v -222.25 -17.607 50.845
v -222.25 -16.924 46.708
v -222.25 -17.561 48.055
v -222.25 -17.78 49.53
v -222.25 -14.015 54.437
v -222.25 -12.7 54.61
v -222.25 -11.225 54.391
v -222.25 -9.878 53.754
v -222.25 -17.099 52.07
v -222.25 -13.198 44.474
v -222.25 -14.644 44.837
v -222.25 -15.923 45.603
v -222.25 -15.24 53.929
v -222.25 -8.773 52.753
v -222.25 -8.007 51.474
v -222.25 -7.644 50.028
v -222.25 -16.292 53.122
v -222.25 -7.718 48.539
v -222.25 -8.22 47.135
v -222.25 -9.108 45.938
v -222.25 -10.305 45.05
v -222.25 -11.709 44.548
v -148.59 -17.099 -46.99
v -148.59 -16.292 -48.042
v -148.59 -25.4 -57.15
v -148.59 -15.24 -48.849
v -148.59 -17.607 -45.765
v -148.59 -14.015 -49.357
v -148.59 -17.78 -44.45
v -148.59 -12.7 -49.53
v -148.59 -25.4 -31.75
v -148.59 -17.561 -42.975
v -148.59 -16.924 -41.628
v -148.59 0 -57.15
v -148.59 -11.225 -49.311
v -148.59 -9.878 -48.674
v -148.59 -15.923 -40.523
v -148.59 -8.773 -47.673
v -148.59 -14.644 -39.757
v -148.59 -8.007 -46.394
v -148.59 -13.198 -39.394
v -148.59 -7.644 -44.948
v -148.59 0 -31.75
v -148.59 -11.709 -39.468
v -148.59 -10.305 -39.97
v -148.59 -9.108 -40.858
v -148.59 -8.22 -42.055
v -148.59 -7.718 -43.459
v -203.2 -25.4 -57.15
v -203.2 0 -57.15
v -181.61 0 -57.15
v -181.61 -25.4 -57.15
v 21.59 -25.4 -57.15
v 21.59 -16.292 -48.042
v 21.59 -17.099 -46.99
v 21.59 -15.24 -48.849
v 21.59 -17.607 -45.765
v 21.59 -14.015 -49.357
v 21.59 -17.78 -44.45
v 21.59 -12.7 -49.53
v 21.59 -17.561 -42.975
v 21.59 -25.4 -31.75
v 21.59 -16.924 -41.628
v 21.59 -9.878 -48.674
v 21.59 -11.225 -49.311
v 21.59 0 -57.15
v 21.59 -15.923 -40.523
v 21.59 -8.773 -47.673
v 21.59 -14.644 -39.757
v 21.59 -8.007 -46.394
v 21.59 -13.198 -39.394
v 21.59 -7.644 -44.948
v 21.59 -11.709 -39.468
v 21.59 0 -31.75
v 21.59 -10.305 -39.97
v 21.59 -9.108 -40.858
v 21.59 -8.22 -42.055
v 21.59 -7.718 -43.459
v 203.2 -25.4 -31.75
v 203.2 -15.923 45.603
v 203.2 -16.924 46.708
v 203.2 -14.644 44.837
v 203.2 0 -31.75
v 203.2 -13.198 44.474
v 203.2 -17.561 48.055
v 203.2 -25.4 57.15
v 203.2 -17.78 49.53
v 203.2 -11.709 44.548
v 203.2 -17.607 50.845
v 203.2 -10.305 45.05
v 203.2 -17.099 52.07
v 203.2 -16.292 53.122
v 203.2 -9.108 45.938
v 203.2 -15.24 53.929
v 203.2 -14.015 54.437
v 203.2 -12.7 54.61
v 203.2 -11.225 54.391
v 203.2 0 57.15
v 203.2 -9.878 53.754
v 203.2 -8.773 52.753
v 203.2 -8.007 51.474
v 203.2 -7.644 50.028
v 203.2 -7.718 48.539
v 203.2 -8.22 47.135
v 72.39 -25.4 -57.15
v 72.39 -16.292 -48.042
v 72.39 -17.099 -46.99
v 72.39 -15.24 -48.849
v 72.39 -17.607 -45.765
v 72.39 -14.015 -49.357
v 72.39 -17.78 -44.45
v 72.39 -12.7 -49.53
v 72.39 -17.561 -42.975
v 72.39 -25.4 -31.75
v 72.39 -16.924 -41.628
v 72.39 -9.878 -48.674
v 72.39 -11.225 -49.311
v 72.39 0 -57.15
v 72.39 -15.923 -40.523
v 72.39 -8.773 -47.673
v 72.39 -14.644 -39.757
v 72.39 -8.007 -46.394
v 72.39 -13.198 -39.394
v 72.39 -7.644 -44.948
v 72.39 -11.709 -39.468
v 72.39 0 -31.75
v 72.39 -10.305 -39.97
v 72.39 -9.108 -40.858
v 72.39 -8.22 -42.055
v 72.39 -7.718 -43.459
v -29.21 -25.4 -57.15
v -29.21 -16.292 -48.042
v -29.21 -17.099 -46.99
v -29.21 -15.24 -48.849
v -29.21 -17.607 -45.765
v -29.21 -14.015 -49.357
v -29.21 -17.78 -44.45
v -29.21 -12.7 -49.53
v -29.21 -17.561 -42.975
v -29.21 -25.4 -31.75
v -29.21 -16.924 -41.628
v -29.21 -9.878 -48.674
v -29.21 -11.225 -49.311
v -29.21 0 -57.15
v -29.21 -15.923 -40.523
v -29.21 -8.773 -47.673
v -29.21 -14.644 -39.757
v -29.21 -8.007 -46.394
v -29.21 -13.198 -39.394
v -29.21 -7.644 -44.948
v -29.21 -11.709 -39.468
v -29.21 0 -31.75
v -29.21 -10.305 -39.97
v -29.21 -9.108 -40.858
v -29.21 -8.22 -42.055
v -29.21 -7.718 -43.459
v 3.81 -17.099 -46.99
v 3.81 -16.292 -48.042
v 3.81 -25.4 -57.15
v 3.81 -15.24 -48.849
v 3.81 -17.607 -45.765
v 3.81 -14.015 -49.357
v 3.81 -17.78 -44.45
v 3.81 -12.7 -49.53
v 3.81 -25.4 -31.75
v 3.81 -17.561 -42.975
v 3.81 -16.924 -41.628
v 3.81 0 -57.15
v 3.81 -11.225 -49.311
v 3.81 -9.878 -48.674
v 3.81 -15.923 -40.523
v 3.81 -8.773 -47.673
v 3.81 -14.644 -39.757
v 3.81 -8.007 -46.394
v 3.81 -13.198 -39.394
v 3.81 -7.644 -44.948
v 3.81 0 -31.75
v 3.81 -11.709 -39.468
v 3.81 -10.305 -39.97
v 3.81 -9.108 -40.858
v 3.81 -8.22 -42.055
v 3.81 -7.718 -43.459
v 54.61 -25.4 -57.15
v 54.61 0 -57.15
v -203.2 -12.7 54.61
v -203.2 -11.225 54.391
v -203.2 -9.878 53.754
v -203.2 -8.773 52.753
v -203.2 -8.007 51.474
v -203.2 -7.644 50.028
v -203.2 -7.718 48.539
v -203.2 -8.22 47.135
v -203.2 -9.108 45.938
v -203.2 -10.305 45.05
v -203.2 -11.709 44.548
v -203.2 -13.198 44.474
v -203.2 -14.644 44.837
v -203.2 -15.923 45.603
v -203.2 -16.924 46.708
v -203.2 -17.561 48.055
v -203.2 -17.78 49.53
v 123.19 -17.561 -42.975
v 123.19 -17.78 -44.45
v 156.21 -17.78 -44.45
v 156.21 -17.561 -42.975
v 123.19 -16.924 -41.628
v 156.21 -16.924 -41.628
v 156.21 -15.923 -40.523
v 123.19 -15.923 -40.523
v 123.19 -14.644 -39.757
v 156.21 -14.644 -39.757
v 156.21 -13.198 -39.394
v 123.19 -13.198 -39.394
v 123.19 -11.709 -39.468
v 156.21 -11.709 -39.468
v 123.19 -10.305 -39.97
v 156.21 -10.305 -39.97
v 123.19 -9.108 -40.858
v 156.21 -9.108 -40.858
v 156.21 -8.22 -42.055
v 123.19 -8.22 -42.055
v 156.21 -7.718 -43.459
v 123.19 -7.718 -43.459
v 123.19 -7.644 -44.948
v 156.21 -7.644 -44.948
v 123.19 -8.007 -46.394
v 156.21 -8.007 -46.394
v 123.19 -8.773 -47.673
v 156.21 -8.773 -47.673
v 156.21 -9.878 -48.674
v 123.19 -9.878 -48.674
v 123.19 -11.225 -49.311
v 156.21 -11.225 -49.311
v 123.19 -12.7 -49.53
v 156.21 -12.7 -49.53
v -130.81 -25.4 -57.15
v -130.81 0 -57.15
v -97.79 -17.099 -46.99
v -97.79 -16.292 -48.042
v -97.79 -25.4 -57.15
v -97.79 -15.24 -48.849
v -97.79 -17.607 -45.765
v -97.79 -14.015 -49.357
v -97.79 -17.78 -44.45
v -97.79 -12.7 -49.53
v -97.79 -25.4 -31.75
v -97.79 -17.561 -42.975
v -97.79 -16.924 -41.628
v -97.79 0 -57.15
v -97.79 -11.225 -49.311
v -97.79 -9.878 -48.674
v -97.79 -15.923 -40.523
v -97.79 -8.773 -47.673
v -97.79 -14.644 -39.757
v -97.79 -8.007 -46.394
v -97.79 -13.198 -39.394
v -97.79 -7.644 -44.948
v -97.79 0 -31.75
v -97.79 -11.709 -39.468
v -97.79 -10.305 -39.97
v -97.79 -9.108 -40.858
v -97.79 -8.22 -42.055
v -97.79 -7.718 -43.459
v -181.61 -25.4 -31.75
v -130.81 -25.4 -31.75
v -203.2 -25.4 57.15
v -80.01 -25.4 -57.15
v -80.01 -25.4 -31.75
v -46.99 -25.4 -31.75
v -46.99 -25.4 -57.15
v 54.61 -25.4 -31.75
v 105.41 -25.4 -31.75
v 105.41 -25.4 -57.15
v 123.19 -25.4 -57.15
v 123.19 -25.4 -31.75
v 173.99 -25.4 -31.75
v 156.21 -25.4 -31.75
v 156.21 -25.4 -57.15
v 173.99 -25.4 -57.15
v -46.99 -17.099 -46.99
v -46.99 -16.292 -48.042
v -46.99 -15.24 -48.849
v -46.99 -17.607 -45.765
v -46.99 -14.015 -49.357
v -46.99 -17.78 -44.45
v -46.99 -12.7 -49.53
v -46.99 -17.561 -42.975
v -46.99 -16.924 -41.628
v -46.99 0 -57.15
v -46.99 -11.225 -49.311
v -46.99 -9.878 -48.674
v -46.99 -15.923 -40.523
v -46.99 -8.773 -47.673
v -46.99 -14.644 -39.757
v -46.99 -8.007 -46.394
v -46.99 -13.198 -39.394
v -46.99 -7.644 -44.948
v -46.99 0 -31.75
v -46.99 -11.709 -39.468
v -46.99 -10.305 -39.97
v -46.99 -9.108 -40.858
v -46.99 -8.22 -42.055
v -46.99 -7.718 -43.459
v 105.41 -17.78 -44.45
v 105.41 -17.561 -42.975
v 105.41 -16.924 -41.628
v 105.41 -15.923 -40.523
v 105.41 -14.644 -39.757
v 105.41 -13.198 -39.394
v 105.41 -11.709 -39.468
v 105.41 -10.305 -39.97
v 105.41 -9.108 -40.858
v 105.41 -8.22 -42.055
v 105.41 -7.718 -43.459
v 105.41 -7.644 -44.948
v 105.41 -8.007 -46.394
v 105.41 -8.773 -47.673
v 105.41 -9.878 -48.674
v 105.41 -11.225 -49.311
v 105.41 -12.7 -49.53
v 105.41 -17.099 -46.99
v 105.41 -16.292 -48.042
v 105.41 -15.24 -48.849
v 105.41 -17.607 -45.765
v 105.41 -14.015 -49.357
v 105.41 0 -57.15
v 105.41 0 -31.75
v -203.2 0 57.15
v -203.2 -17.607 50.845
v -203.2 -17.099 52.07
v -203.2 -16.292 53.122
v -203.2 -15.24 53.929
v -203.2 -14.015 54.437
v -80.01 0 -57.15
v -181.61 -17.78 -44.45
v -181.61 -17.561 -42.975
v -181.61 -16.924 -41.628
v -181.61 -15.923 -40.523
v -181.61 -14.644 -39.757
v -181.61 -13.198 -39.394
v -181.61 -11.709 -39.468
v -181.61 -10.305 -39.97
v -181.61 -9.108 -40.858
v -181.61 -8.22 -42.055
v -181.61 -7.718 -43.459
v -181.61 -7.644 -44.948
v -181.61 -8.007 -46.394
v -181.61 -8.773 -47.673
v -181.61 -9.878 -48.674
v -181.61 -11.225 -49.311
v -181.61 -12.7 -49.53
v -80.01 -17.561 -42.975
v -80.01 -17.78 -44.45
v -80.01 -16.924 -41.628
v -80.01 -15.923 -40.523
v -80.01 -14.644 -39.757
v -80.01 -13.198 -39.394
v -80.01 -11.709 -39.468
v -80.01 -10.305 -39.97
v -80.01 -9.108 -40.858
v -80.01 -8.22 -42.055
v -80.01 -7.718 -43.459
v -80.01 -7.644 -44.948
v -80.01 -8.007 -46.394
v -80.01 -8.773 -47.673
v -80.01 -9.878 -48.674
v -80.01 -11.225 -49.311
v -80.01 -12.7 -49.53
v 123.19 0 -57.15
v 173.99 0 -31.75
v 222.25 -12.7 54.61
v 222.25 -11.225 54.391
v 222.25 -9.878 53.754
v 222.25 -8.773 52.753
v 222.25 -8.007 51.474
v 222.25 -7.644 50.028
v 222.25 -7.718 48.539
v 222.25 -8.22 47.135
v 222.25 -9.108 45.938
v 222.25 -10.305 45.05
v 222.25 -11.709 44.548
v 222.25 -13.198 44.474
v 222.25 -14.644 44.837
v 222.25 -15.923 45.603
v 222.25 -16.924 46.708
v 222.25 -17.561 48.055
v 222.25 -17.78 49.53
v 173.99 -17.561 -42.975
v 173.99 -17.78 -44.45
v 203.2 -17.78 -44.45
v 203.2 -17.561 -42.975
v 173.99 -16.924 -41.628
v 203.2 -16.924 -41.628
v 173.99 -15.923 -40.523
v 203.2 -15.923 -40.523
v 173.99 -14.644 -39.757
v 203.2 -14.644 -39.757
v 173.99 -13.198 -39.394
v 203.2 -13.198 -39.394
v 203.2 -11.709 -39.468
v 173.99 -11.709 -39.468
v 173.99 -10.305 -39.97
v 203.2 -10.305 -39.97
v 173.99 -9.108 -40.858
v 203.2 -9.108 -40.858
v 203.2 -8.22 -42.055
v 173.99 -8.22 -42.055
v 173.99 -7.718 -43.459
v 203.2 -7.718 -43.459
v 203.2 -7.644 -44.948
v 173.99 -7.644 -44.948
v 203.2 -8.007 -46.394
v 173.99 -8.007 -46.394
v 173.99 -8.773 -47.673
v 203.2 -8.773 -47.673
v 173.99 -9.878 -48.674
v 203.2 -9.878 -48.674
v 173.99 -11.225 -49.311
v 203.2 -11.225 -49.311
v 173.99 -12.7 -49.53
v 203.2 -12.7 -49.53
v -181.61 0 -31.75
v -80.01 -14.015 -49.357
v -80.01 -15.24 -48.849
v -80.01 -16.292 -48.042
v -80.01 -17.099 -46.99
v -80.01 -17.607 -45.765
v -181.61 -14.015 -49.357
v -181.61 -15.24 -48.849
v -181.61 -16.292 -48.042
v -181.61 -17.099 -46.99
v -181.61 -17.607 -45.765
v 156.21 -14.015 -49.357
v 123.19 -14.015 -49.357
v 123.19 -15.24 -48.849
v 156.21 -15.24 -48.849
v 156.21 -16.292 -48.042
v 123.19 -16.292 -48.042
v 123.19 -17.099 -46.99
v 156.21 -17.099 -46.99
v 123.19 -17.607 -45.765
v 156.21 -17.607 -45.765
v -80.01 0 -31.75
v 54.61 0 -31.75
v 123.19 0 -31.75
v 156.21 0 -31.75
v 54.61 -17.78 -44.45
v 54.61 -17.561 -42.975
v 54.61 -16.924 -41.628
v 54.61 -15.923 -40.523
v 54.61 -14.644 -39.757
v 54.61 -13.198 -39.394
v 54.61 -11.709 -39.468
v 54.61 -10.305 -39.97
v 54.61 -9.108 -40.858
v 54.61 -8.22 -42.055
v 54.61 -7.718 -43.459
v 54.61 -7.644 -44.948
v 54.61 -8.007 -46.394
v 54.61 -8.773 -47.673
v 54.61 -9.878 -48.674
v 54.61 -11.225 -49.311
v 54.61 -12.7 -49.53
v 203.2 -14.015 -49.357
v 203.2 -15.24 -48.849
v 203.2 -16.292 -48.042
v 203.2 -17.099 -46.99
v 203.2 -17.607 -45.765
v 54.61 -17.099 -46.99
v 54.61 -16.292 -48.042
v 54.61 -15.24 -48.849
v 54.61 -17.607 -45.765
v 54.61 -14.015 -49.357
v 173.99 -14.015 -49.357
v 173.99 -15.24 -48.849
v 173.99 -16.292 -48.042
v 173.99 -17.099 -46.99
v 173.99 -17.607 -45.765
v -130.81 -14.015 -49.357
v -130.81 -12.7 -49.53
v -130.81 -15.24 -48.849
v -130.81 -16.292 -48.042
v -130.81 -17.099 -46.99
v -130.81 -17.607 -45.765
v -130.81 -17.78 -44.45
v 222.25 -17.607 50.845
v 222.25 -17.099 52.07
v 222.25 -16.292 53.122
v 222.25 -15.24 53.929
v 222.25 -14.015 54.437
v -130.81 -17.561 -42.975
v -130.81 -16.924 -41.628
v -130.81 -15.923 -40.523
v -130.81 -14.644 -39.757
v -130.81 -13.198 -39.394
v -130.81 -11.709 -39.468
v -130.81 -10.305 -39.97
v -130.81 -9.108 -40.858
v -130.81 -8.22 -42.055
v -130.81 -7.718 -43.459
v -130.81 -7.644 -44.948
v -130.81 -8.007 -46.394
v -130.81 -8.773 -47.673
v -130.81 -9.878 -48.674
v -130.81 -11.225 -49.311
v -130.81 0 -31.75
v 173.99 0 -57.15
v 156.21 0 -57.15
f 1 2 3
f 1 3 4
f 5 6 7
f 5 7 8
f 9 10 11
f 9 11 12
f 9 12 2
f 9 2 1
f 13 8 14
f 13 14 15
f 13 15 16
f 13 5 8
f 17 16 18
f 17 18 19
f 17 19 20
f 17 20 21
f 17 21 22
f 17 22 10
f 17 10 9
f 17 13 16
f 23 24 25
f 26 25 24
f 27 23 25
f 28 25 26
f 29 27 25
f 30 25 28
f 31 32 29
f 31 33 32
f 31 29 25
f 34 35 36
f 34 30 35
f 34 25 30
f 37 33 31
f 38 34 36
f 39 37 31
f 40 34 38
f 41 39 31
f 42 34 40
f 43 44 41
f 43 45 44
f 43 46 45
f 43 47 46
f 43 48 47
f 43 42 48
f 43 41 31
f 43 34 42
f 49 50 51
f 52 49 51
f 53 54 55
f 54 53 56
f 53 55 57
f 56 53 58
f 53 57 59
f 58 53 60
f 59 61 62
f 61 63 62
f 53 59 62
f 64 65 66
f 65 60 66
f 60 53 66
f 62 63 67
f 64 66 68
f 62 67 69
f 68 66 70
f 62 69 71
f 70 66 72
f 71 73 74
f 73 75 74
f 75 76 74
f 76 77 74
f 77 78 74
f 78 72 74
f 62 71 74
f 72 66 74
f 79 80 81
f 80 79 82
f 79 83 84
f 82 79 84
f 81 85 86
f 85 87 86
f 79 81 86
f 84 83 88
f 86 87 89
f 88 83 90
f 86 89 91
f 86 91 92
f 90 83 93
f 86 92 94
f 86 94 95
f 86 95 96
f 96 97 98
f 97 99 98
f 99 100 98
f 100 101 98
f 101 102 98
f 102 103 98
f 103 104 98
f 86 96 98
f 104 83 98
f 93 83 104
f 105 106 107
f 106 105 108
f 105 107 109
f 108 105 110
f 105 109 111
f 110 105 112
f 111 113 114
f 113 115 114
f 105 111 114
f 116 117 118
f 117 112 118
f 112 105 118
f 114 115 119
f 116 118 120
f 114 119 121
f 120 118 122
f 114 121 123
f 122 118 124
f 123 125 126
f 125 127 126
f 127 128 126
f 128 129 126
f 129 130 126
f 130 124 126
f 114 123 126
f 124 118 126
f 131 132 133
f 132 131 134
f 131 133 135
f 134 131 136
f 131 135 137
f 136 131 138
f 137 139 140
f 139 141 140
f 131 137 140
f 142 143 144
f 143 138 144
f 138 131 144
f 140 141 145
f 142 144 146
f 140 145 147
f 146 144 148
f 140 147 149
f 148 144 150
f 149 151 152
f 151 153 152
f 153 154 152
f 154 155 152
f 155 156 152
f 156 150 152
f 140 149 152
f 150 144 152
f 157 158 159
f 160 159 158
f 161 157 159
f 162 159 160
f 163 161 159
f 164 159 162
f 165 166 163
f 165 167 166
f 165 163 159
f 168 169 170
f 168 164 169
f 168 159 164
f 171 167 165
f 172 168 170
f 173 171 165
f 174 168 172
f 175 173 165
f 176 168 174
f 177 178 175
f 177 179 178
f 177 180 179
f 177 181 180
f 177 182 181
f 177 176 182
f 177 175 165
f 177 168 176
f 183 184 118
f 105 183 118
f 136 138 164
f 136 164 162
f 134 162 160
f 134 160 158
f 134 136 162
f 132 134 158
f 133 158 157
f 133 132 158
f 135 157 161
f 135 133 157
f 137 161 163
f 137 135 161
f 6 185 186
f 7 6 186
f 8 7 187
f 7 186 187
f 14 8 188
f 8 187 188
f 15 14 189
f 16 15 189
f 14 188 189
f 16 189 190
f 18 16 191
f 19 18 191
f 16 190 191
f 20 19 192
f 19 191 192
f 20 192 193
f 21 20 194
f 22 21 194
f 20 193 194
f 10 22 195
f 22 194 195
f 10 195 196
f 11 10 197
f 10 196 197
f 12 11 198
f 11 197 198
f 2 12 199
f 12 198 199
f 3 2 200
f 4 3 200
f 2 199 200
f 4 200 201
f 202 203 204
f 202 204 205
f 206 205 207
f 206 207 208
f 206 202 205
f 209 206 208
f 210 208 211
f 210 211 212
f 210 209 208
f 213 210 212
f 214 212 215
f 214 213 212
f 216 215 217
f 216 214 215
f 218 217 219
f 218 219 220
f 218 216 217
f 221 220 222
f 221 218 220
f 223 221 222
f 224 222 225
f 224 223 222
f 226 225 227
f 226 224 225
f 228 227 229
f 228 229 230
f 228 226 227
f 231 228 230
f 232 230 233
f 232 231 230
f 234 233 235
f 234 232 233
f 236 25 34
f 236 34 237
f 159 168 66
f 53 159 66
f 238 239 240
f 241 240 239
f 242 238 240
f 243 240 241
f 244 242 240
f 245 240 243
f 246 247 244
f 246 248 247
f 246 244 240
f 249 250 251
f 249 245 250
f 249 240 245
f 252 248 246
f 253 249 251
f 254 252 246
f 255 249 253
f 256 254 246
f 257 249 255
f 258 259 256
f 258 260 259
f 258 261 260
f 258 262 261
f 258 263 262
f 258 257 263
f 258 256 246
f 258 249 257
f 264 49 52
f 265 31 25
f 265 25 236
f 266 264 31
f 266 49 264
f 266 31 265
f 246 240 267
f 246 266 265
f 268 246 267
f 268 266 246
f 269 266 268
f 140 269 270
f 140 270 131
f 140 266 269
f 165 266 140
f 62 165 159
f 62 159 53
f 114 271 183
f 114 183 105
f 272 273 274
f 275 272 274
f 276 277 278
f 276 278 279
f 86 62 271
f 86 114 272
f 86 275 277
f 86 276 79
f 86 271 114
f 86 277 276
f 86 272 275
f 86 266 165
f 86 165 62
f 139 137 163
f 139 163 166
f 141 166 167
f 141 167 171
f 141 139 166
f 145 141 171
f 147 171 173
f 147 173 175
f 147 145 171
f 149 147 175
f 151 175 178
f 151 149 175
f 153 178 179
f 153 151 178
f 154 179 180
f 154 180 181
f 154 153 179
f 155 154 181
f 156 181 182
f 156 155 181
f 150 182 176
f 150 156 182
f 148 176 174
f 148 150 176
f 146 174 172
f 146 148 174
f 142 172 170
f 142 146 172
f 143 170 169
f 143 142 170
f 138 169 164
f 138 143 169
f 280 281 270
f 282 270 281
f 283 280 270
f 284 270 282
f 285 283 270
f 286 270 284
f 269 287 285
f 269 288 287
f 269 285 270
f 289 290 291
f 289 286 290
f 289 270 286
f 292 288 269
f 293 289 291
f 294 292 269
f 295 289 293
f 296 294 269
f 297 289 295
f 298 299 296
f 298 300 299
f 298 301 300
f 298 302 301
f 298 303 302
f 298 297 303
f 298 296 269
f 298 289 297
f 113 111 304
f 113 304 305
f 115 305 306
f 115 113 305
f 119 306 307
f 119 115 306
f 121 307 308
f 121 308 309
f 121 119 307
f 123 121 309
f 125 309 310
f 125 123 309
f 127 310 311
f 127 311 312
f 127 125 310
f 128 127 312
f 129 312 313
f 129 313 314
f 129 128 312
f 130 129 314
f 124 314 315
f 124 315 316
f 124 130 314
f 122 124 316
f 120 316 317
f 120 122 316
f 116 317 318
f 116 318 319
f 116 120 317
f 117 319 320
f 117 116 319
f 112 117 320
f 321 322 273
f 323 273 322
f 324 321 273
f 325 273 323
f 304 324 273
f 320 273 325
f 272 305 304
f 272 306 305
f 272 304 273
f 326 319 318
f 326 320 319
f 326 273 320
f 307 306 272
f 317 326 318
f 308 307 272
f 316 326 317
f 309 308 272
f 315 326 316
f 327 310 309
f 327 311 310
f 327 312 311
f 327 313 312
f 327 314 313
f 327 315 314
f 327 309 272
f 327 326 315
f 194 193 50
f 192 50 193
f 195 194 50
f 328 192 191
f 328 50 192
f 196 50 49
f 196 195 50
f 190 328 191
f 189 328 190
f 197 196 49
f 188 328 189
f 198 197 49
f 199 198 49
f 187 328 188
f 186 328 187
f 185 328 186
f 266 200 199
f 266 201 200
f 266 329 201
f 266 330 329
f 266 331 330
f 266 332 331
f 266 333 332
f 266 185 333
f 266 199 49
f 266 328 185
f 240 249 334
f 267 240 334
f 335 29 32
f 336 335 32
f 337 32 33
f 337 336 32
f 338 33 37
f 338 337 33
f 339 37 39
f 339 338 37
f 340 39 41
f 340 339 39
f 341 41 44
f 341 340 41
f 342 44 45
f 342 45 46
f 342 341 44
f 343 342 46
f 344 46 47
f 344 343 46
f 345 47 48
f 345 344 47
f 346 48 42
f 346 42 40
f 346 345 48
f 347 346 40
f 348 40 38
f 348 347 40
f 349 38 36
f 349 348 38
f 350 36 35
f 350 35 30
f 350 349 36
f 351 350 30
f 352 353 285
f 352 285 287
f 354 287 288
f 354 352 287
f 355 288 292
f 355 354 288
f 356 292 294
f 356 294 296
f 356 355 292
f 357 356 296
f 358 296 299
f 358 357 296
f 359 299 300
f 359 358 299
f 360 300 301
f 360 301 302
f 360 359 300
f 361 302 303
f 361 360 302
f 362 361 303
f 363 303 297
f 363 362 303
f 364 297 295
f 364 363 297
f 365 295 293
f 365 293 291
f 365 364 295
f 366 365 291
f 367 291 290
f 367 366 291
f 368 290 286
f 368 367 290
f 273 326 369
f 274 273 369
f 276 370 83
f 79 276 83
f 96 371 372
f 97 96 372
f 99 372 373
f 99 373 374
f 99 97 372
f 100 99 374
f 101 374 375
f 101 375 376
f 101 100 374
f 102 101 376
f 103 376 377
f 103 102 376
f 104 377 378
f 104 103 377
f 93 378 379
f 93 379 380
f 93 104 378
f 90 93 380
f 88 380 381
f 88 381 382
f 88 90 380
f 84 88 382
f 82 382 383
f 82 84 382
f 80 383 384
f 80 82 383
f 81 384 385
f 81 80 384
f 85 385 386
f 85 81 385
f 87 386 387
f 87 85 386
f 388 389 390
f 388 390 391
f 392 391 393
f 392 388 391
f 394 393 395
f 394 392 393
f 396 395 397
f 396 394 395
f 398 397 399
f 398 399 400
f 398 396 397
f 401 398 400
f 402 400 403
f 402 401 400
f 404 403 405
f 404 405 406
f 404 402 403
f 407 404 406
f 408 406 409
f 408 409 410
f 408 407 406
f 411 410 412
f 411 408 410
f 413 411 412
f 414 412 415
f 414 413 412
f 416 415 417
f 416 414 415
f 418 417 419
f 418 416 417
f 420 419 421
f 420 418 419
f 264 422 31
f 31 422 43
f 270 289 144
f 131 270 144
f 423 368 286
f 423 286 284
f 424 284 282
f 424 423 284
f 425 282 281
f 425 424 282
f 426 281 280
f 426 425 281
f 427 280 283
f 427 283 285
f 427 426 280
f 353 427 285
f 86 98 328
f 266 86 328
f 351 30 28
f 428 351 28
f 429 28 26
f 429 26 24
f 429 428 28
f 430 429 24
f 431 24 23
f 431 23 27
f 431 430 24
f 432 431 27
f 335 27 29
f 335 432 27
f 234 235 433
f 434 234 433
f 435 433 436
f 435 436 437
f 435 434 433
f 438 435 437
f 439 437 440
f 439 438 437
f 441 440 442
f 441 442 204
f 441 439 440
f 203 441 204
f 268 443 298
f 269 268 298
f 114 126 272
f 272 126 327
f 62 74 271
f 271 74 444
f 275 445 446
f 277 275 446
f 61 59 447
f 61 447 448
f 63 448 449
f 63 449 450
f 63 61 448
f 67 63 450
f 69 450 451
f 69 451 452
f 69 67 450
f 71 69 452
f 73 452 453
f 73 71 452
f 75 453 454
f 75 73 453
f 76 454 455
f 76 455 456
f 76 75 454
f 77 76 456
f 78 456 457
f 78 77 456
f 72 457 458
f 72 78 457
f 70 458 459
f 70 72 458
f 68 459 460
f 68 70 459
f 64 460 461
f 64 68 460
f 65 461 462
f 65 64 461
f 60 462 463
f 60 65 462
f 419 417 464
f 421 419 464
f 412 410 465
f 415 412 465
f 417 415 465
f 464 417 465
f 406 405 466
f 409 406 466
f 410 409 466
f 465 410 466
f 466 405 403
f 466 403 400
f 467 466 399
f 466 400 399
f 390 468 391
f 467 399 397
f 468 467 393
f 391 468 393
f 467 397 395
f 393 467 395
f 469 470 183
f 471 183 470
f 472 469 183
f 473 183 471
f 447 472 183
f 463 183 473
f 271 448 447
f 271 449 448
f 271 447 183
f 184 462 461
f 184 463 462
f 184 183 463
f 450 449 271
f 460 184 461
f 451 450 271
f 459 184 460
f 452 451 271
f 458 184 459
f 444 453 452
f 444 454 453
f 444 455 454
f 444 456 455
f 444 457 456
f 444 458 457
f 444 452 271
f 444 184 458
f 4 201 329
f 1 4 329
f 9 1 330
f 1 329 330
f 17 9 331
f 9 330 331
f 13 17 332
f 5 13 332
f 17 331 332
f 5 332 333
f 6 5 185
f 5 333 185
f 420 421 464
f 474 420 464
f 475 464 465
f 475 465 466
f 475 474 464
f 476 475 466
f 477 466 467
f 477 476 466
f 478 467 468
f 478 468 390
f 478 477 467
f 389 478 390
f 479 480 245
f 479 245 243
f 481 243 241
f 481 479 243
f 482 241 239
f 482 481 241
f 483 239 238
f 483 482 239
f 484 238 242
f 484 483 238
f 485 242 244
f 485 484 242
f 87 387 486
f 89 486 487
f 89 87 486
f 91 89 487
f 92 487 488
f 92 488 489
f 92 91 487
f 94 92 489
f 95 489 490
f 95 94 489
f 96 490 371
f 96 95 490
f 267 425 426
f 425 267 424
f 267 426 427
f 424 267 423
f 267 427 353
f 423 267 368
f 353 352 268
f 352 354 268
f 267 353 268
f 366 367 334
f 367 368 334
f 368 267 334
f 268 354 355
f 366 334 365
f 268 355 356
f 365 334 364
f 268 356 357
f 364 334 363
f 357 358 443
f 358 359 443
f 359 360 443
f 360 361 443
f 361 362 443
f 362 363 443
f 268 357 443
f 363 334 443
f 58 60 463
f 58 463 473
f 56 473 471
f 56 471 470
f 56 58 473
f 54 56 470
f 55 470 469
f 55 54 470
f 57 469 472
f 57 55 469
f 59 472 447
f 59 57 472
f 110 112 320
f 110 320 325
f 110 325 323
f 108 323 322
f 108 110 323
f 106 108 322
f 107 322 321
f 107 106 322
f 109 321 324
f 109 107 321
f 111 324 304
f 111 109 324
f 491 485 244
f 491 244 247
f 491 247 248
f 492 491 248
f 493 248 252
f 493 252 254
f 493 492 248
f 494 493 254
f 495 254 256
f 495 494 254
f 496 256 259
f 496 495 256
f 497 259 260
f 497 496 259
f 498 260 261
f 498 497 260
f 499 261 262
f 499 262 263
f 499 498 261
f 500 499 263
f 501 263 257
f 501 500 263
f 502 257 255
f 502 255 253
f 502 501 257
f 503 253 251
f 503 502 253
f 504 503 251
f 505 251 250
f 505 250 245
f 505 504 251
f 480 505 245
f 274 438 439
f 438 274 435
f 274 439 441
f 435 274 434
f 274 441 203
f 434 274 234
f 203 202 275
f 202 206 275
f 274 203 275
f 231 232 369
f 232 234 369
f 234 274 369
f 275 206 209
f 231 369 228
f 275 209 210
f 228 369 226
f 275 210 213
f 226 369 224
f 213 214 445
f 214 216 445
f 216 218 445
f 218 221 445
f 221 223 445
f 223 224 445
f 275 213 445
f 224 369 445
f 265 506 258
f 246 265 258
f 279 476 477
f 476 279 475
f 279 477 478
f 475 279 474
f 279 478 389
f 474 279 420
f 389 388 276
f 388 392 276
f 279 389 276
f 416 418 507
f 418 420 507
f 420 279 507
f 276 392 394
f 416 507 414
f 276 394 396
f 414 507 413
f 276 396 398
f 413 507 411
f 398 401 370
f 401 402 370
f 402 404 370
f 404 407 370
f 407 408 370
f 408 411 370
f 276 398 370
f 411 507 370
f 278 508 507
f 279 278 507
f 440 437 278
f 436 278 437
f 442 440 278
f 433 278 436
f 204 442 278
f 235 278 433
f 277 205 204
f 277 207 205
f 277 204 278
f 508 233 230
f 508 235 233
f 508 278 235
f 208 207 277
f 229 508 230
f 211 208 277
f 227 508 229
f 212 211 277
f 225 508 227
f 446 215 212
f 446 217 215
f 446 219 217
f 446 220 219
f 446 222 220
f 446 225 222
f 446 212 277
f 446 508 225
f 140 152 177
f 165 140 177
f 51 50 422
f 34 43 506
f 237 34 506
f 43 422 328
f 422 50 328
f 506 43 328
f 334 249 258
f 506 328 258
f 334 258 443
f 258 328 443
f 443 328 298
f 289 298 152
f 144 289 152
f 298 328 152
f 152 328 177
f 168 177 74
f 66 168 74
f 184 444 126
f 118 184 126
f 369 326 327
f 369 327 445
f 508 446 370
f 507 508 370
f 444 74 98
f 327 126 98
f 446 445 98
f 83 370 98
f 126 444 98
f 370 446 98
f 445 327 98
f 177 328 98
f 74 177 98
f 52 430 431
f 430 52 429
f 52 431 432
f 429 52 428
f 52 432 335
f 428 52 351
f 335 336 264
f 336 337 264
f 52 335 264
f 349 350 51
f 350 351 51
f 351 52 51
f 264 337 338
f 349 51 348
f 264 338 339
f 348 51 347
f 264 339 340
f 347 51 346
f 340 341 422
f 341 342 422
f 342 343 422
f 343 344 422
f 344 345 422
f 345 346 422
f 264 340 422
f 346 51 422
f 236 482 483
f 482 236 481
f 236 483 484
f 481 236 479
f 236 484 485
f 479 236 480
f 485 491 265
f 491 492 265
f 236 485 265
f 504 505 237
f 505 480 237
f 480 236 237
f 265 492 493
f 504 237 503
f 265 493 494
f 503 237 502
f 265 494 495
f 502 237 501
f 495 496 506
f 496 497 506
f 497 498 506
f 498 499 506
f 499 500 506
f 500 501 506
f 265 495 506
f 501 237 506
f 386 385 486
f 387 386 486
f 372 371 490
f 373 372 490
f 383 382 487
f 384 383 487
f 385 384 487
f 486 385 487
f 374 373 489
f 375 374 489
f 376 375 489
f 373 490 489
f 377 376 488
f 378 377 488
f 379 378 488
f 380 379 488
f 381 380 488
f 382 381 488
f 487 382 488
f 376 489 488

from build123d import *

# Parameters (mm, degrees)
F0_W          = 17.78
F0_H          = 25.4
F0_W_2        = 3.81
F1_DEPTH      = 25.4
F3_DEPTH      = 406.4
F5_DEPTH      = 19.05
F5_DEPTH_BACK = 425.45


with BuildPart() as f1:
    # F0 (on Front) → F1 (new body)
    with BuildSketch(Plane.XZ):
        Polygon((199.39, -31.75), (203.2, -31.75), (203.2, 57.15), (-203.2, 57.15), (-203.2, -31.75), (-199.39, -31.75), (-181.61, -31.75), (-177.8, -31.75), (-173.99, -31.75), (-156.21, -31.75), (-152.4, -31.75), (-148.59, -31.75), (-130.81, -31.75), (-127, -31.75), (-123.19, -31.75), (-105.41, -31.75), (-101.6, -31.75), (-97.79, -31.75), (-80.01, -31.75), (-76.2, -31.75), (-72.39, -31.75), (-54.61, -31.75), (-50.8, -31.75), (-46.99, -31.75), (-29.21, -31.75), (-25.4, -31.75), (-21.59, -31.75), (-3.81, -31.75), (0, -31.75), (3.81, -31.75), (21.59, -31.75), (25.4, -31.75), (29.21, -31.75), (46.99, -31.75), (50.8, -31.75), (54.61, -31.75), (72.39, -31.75), (76.2, -31.75), (80.01, -31.75), (97.79, -31.75), (101.6, -31.75), (105.41, -31.75), (123.19, -31.75), (127, -31.75), (130.81, -31.75), (148.59, -31.75), (152.4, -31.75), (156.21, -31.75), (173.99, -31.75), (177.8, -31.75), (181.61, -31.75), align=None)
        with Locations((-190.5, -44.45)):
            Rectangle(F0_W, F0_H)
        with Locations((-139.7, -44.45)):
            Rectangle(F0_W, F0_H)
        with Locations((-88.9, -44.45)):
            Rectangle(F0_W, F0_H)
        with Locations((-38.1, -44.45)):
            Rectangle(F0_W, F0_H)
        with Locations((12.7, -44.45)):
            Rectangle(F0_W, F0_H)
        with Locations((63.5, -44.45)):
            Rectangle(F0_W, F0_H)
        with Locations((165.1, -44.45)):
            Rectangle(F0_W, F0_H)
        with Locations((114.3, -44.45)):
            Rectangle(F0_W, F0_H)
        with Locations((-201.295, -44.45)):
            Rectangle(F0_W_2, F0_H)
    extrude(amount=F1_DEPTH)

    # F2 (on face) → F3 (join)
    with BuildSketch(Plane(origin=(-203.2, 0, 0), x_dir=(0, -1, 0), z_dir=(-1, 0, 0))):
        with BuildLine():
            ThreePointArc((12.7, -49.53), (16.292102, -48.042102), (17.78, -44.45))
            ThreePointArc((17.78, -44.45), (9.107898, -40.857898), (12.7, -49.53))
        make_face()
    extrude(amount=-F3_DEPTH)

    # F4 (on face) → F5 (join, two sides)
    with BuildSketch(Plane(origin=(-203.2, 0, 0), x_dir=(0, -1, 0), z_dir=(-1, 0, 0))) as f5_sk:
        with BuildLine():
            ThreePointArc((12.7, 54.61), (9.107898, 45.937898), (17.78, 49.53))
            ThreePointArc((17.78, 49.53), (16.292102, 53.122102), (12.7, 54.61))
        make_face()
    extrude(amount=F5_DEPTH)
    extrude(f5_sk.sketch, amount=-F5_DEPTH_BACK)


solid = f1.part
